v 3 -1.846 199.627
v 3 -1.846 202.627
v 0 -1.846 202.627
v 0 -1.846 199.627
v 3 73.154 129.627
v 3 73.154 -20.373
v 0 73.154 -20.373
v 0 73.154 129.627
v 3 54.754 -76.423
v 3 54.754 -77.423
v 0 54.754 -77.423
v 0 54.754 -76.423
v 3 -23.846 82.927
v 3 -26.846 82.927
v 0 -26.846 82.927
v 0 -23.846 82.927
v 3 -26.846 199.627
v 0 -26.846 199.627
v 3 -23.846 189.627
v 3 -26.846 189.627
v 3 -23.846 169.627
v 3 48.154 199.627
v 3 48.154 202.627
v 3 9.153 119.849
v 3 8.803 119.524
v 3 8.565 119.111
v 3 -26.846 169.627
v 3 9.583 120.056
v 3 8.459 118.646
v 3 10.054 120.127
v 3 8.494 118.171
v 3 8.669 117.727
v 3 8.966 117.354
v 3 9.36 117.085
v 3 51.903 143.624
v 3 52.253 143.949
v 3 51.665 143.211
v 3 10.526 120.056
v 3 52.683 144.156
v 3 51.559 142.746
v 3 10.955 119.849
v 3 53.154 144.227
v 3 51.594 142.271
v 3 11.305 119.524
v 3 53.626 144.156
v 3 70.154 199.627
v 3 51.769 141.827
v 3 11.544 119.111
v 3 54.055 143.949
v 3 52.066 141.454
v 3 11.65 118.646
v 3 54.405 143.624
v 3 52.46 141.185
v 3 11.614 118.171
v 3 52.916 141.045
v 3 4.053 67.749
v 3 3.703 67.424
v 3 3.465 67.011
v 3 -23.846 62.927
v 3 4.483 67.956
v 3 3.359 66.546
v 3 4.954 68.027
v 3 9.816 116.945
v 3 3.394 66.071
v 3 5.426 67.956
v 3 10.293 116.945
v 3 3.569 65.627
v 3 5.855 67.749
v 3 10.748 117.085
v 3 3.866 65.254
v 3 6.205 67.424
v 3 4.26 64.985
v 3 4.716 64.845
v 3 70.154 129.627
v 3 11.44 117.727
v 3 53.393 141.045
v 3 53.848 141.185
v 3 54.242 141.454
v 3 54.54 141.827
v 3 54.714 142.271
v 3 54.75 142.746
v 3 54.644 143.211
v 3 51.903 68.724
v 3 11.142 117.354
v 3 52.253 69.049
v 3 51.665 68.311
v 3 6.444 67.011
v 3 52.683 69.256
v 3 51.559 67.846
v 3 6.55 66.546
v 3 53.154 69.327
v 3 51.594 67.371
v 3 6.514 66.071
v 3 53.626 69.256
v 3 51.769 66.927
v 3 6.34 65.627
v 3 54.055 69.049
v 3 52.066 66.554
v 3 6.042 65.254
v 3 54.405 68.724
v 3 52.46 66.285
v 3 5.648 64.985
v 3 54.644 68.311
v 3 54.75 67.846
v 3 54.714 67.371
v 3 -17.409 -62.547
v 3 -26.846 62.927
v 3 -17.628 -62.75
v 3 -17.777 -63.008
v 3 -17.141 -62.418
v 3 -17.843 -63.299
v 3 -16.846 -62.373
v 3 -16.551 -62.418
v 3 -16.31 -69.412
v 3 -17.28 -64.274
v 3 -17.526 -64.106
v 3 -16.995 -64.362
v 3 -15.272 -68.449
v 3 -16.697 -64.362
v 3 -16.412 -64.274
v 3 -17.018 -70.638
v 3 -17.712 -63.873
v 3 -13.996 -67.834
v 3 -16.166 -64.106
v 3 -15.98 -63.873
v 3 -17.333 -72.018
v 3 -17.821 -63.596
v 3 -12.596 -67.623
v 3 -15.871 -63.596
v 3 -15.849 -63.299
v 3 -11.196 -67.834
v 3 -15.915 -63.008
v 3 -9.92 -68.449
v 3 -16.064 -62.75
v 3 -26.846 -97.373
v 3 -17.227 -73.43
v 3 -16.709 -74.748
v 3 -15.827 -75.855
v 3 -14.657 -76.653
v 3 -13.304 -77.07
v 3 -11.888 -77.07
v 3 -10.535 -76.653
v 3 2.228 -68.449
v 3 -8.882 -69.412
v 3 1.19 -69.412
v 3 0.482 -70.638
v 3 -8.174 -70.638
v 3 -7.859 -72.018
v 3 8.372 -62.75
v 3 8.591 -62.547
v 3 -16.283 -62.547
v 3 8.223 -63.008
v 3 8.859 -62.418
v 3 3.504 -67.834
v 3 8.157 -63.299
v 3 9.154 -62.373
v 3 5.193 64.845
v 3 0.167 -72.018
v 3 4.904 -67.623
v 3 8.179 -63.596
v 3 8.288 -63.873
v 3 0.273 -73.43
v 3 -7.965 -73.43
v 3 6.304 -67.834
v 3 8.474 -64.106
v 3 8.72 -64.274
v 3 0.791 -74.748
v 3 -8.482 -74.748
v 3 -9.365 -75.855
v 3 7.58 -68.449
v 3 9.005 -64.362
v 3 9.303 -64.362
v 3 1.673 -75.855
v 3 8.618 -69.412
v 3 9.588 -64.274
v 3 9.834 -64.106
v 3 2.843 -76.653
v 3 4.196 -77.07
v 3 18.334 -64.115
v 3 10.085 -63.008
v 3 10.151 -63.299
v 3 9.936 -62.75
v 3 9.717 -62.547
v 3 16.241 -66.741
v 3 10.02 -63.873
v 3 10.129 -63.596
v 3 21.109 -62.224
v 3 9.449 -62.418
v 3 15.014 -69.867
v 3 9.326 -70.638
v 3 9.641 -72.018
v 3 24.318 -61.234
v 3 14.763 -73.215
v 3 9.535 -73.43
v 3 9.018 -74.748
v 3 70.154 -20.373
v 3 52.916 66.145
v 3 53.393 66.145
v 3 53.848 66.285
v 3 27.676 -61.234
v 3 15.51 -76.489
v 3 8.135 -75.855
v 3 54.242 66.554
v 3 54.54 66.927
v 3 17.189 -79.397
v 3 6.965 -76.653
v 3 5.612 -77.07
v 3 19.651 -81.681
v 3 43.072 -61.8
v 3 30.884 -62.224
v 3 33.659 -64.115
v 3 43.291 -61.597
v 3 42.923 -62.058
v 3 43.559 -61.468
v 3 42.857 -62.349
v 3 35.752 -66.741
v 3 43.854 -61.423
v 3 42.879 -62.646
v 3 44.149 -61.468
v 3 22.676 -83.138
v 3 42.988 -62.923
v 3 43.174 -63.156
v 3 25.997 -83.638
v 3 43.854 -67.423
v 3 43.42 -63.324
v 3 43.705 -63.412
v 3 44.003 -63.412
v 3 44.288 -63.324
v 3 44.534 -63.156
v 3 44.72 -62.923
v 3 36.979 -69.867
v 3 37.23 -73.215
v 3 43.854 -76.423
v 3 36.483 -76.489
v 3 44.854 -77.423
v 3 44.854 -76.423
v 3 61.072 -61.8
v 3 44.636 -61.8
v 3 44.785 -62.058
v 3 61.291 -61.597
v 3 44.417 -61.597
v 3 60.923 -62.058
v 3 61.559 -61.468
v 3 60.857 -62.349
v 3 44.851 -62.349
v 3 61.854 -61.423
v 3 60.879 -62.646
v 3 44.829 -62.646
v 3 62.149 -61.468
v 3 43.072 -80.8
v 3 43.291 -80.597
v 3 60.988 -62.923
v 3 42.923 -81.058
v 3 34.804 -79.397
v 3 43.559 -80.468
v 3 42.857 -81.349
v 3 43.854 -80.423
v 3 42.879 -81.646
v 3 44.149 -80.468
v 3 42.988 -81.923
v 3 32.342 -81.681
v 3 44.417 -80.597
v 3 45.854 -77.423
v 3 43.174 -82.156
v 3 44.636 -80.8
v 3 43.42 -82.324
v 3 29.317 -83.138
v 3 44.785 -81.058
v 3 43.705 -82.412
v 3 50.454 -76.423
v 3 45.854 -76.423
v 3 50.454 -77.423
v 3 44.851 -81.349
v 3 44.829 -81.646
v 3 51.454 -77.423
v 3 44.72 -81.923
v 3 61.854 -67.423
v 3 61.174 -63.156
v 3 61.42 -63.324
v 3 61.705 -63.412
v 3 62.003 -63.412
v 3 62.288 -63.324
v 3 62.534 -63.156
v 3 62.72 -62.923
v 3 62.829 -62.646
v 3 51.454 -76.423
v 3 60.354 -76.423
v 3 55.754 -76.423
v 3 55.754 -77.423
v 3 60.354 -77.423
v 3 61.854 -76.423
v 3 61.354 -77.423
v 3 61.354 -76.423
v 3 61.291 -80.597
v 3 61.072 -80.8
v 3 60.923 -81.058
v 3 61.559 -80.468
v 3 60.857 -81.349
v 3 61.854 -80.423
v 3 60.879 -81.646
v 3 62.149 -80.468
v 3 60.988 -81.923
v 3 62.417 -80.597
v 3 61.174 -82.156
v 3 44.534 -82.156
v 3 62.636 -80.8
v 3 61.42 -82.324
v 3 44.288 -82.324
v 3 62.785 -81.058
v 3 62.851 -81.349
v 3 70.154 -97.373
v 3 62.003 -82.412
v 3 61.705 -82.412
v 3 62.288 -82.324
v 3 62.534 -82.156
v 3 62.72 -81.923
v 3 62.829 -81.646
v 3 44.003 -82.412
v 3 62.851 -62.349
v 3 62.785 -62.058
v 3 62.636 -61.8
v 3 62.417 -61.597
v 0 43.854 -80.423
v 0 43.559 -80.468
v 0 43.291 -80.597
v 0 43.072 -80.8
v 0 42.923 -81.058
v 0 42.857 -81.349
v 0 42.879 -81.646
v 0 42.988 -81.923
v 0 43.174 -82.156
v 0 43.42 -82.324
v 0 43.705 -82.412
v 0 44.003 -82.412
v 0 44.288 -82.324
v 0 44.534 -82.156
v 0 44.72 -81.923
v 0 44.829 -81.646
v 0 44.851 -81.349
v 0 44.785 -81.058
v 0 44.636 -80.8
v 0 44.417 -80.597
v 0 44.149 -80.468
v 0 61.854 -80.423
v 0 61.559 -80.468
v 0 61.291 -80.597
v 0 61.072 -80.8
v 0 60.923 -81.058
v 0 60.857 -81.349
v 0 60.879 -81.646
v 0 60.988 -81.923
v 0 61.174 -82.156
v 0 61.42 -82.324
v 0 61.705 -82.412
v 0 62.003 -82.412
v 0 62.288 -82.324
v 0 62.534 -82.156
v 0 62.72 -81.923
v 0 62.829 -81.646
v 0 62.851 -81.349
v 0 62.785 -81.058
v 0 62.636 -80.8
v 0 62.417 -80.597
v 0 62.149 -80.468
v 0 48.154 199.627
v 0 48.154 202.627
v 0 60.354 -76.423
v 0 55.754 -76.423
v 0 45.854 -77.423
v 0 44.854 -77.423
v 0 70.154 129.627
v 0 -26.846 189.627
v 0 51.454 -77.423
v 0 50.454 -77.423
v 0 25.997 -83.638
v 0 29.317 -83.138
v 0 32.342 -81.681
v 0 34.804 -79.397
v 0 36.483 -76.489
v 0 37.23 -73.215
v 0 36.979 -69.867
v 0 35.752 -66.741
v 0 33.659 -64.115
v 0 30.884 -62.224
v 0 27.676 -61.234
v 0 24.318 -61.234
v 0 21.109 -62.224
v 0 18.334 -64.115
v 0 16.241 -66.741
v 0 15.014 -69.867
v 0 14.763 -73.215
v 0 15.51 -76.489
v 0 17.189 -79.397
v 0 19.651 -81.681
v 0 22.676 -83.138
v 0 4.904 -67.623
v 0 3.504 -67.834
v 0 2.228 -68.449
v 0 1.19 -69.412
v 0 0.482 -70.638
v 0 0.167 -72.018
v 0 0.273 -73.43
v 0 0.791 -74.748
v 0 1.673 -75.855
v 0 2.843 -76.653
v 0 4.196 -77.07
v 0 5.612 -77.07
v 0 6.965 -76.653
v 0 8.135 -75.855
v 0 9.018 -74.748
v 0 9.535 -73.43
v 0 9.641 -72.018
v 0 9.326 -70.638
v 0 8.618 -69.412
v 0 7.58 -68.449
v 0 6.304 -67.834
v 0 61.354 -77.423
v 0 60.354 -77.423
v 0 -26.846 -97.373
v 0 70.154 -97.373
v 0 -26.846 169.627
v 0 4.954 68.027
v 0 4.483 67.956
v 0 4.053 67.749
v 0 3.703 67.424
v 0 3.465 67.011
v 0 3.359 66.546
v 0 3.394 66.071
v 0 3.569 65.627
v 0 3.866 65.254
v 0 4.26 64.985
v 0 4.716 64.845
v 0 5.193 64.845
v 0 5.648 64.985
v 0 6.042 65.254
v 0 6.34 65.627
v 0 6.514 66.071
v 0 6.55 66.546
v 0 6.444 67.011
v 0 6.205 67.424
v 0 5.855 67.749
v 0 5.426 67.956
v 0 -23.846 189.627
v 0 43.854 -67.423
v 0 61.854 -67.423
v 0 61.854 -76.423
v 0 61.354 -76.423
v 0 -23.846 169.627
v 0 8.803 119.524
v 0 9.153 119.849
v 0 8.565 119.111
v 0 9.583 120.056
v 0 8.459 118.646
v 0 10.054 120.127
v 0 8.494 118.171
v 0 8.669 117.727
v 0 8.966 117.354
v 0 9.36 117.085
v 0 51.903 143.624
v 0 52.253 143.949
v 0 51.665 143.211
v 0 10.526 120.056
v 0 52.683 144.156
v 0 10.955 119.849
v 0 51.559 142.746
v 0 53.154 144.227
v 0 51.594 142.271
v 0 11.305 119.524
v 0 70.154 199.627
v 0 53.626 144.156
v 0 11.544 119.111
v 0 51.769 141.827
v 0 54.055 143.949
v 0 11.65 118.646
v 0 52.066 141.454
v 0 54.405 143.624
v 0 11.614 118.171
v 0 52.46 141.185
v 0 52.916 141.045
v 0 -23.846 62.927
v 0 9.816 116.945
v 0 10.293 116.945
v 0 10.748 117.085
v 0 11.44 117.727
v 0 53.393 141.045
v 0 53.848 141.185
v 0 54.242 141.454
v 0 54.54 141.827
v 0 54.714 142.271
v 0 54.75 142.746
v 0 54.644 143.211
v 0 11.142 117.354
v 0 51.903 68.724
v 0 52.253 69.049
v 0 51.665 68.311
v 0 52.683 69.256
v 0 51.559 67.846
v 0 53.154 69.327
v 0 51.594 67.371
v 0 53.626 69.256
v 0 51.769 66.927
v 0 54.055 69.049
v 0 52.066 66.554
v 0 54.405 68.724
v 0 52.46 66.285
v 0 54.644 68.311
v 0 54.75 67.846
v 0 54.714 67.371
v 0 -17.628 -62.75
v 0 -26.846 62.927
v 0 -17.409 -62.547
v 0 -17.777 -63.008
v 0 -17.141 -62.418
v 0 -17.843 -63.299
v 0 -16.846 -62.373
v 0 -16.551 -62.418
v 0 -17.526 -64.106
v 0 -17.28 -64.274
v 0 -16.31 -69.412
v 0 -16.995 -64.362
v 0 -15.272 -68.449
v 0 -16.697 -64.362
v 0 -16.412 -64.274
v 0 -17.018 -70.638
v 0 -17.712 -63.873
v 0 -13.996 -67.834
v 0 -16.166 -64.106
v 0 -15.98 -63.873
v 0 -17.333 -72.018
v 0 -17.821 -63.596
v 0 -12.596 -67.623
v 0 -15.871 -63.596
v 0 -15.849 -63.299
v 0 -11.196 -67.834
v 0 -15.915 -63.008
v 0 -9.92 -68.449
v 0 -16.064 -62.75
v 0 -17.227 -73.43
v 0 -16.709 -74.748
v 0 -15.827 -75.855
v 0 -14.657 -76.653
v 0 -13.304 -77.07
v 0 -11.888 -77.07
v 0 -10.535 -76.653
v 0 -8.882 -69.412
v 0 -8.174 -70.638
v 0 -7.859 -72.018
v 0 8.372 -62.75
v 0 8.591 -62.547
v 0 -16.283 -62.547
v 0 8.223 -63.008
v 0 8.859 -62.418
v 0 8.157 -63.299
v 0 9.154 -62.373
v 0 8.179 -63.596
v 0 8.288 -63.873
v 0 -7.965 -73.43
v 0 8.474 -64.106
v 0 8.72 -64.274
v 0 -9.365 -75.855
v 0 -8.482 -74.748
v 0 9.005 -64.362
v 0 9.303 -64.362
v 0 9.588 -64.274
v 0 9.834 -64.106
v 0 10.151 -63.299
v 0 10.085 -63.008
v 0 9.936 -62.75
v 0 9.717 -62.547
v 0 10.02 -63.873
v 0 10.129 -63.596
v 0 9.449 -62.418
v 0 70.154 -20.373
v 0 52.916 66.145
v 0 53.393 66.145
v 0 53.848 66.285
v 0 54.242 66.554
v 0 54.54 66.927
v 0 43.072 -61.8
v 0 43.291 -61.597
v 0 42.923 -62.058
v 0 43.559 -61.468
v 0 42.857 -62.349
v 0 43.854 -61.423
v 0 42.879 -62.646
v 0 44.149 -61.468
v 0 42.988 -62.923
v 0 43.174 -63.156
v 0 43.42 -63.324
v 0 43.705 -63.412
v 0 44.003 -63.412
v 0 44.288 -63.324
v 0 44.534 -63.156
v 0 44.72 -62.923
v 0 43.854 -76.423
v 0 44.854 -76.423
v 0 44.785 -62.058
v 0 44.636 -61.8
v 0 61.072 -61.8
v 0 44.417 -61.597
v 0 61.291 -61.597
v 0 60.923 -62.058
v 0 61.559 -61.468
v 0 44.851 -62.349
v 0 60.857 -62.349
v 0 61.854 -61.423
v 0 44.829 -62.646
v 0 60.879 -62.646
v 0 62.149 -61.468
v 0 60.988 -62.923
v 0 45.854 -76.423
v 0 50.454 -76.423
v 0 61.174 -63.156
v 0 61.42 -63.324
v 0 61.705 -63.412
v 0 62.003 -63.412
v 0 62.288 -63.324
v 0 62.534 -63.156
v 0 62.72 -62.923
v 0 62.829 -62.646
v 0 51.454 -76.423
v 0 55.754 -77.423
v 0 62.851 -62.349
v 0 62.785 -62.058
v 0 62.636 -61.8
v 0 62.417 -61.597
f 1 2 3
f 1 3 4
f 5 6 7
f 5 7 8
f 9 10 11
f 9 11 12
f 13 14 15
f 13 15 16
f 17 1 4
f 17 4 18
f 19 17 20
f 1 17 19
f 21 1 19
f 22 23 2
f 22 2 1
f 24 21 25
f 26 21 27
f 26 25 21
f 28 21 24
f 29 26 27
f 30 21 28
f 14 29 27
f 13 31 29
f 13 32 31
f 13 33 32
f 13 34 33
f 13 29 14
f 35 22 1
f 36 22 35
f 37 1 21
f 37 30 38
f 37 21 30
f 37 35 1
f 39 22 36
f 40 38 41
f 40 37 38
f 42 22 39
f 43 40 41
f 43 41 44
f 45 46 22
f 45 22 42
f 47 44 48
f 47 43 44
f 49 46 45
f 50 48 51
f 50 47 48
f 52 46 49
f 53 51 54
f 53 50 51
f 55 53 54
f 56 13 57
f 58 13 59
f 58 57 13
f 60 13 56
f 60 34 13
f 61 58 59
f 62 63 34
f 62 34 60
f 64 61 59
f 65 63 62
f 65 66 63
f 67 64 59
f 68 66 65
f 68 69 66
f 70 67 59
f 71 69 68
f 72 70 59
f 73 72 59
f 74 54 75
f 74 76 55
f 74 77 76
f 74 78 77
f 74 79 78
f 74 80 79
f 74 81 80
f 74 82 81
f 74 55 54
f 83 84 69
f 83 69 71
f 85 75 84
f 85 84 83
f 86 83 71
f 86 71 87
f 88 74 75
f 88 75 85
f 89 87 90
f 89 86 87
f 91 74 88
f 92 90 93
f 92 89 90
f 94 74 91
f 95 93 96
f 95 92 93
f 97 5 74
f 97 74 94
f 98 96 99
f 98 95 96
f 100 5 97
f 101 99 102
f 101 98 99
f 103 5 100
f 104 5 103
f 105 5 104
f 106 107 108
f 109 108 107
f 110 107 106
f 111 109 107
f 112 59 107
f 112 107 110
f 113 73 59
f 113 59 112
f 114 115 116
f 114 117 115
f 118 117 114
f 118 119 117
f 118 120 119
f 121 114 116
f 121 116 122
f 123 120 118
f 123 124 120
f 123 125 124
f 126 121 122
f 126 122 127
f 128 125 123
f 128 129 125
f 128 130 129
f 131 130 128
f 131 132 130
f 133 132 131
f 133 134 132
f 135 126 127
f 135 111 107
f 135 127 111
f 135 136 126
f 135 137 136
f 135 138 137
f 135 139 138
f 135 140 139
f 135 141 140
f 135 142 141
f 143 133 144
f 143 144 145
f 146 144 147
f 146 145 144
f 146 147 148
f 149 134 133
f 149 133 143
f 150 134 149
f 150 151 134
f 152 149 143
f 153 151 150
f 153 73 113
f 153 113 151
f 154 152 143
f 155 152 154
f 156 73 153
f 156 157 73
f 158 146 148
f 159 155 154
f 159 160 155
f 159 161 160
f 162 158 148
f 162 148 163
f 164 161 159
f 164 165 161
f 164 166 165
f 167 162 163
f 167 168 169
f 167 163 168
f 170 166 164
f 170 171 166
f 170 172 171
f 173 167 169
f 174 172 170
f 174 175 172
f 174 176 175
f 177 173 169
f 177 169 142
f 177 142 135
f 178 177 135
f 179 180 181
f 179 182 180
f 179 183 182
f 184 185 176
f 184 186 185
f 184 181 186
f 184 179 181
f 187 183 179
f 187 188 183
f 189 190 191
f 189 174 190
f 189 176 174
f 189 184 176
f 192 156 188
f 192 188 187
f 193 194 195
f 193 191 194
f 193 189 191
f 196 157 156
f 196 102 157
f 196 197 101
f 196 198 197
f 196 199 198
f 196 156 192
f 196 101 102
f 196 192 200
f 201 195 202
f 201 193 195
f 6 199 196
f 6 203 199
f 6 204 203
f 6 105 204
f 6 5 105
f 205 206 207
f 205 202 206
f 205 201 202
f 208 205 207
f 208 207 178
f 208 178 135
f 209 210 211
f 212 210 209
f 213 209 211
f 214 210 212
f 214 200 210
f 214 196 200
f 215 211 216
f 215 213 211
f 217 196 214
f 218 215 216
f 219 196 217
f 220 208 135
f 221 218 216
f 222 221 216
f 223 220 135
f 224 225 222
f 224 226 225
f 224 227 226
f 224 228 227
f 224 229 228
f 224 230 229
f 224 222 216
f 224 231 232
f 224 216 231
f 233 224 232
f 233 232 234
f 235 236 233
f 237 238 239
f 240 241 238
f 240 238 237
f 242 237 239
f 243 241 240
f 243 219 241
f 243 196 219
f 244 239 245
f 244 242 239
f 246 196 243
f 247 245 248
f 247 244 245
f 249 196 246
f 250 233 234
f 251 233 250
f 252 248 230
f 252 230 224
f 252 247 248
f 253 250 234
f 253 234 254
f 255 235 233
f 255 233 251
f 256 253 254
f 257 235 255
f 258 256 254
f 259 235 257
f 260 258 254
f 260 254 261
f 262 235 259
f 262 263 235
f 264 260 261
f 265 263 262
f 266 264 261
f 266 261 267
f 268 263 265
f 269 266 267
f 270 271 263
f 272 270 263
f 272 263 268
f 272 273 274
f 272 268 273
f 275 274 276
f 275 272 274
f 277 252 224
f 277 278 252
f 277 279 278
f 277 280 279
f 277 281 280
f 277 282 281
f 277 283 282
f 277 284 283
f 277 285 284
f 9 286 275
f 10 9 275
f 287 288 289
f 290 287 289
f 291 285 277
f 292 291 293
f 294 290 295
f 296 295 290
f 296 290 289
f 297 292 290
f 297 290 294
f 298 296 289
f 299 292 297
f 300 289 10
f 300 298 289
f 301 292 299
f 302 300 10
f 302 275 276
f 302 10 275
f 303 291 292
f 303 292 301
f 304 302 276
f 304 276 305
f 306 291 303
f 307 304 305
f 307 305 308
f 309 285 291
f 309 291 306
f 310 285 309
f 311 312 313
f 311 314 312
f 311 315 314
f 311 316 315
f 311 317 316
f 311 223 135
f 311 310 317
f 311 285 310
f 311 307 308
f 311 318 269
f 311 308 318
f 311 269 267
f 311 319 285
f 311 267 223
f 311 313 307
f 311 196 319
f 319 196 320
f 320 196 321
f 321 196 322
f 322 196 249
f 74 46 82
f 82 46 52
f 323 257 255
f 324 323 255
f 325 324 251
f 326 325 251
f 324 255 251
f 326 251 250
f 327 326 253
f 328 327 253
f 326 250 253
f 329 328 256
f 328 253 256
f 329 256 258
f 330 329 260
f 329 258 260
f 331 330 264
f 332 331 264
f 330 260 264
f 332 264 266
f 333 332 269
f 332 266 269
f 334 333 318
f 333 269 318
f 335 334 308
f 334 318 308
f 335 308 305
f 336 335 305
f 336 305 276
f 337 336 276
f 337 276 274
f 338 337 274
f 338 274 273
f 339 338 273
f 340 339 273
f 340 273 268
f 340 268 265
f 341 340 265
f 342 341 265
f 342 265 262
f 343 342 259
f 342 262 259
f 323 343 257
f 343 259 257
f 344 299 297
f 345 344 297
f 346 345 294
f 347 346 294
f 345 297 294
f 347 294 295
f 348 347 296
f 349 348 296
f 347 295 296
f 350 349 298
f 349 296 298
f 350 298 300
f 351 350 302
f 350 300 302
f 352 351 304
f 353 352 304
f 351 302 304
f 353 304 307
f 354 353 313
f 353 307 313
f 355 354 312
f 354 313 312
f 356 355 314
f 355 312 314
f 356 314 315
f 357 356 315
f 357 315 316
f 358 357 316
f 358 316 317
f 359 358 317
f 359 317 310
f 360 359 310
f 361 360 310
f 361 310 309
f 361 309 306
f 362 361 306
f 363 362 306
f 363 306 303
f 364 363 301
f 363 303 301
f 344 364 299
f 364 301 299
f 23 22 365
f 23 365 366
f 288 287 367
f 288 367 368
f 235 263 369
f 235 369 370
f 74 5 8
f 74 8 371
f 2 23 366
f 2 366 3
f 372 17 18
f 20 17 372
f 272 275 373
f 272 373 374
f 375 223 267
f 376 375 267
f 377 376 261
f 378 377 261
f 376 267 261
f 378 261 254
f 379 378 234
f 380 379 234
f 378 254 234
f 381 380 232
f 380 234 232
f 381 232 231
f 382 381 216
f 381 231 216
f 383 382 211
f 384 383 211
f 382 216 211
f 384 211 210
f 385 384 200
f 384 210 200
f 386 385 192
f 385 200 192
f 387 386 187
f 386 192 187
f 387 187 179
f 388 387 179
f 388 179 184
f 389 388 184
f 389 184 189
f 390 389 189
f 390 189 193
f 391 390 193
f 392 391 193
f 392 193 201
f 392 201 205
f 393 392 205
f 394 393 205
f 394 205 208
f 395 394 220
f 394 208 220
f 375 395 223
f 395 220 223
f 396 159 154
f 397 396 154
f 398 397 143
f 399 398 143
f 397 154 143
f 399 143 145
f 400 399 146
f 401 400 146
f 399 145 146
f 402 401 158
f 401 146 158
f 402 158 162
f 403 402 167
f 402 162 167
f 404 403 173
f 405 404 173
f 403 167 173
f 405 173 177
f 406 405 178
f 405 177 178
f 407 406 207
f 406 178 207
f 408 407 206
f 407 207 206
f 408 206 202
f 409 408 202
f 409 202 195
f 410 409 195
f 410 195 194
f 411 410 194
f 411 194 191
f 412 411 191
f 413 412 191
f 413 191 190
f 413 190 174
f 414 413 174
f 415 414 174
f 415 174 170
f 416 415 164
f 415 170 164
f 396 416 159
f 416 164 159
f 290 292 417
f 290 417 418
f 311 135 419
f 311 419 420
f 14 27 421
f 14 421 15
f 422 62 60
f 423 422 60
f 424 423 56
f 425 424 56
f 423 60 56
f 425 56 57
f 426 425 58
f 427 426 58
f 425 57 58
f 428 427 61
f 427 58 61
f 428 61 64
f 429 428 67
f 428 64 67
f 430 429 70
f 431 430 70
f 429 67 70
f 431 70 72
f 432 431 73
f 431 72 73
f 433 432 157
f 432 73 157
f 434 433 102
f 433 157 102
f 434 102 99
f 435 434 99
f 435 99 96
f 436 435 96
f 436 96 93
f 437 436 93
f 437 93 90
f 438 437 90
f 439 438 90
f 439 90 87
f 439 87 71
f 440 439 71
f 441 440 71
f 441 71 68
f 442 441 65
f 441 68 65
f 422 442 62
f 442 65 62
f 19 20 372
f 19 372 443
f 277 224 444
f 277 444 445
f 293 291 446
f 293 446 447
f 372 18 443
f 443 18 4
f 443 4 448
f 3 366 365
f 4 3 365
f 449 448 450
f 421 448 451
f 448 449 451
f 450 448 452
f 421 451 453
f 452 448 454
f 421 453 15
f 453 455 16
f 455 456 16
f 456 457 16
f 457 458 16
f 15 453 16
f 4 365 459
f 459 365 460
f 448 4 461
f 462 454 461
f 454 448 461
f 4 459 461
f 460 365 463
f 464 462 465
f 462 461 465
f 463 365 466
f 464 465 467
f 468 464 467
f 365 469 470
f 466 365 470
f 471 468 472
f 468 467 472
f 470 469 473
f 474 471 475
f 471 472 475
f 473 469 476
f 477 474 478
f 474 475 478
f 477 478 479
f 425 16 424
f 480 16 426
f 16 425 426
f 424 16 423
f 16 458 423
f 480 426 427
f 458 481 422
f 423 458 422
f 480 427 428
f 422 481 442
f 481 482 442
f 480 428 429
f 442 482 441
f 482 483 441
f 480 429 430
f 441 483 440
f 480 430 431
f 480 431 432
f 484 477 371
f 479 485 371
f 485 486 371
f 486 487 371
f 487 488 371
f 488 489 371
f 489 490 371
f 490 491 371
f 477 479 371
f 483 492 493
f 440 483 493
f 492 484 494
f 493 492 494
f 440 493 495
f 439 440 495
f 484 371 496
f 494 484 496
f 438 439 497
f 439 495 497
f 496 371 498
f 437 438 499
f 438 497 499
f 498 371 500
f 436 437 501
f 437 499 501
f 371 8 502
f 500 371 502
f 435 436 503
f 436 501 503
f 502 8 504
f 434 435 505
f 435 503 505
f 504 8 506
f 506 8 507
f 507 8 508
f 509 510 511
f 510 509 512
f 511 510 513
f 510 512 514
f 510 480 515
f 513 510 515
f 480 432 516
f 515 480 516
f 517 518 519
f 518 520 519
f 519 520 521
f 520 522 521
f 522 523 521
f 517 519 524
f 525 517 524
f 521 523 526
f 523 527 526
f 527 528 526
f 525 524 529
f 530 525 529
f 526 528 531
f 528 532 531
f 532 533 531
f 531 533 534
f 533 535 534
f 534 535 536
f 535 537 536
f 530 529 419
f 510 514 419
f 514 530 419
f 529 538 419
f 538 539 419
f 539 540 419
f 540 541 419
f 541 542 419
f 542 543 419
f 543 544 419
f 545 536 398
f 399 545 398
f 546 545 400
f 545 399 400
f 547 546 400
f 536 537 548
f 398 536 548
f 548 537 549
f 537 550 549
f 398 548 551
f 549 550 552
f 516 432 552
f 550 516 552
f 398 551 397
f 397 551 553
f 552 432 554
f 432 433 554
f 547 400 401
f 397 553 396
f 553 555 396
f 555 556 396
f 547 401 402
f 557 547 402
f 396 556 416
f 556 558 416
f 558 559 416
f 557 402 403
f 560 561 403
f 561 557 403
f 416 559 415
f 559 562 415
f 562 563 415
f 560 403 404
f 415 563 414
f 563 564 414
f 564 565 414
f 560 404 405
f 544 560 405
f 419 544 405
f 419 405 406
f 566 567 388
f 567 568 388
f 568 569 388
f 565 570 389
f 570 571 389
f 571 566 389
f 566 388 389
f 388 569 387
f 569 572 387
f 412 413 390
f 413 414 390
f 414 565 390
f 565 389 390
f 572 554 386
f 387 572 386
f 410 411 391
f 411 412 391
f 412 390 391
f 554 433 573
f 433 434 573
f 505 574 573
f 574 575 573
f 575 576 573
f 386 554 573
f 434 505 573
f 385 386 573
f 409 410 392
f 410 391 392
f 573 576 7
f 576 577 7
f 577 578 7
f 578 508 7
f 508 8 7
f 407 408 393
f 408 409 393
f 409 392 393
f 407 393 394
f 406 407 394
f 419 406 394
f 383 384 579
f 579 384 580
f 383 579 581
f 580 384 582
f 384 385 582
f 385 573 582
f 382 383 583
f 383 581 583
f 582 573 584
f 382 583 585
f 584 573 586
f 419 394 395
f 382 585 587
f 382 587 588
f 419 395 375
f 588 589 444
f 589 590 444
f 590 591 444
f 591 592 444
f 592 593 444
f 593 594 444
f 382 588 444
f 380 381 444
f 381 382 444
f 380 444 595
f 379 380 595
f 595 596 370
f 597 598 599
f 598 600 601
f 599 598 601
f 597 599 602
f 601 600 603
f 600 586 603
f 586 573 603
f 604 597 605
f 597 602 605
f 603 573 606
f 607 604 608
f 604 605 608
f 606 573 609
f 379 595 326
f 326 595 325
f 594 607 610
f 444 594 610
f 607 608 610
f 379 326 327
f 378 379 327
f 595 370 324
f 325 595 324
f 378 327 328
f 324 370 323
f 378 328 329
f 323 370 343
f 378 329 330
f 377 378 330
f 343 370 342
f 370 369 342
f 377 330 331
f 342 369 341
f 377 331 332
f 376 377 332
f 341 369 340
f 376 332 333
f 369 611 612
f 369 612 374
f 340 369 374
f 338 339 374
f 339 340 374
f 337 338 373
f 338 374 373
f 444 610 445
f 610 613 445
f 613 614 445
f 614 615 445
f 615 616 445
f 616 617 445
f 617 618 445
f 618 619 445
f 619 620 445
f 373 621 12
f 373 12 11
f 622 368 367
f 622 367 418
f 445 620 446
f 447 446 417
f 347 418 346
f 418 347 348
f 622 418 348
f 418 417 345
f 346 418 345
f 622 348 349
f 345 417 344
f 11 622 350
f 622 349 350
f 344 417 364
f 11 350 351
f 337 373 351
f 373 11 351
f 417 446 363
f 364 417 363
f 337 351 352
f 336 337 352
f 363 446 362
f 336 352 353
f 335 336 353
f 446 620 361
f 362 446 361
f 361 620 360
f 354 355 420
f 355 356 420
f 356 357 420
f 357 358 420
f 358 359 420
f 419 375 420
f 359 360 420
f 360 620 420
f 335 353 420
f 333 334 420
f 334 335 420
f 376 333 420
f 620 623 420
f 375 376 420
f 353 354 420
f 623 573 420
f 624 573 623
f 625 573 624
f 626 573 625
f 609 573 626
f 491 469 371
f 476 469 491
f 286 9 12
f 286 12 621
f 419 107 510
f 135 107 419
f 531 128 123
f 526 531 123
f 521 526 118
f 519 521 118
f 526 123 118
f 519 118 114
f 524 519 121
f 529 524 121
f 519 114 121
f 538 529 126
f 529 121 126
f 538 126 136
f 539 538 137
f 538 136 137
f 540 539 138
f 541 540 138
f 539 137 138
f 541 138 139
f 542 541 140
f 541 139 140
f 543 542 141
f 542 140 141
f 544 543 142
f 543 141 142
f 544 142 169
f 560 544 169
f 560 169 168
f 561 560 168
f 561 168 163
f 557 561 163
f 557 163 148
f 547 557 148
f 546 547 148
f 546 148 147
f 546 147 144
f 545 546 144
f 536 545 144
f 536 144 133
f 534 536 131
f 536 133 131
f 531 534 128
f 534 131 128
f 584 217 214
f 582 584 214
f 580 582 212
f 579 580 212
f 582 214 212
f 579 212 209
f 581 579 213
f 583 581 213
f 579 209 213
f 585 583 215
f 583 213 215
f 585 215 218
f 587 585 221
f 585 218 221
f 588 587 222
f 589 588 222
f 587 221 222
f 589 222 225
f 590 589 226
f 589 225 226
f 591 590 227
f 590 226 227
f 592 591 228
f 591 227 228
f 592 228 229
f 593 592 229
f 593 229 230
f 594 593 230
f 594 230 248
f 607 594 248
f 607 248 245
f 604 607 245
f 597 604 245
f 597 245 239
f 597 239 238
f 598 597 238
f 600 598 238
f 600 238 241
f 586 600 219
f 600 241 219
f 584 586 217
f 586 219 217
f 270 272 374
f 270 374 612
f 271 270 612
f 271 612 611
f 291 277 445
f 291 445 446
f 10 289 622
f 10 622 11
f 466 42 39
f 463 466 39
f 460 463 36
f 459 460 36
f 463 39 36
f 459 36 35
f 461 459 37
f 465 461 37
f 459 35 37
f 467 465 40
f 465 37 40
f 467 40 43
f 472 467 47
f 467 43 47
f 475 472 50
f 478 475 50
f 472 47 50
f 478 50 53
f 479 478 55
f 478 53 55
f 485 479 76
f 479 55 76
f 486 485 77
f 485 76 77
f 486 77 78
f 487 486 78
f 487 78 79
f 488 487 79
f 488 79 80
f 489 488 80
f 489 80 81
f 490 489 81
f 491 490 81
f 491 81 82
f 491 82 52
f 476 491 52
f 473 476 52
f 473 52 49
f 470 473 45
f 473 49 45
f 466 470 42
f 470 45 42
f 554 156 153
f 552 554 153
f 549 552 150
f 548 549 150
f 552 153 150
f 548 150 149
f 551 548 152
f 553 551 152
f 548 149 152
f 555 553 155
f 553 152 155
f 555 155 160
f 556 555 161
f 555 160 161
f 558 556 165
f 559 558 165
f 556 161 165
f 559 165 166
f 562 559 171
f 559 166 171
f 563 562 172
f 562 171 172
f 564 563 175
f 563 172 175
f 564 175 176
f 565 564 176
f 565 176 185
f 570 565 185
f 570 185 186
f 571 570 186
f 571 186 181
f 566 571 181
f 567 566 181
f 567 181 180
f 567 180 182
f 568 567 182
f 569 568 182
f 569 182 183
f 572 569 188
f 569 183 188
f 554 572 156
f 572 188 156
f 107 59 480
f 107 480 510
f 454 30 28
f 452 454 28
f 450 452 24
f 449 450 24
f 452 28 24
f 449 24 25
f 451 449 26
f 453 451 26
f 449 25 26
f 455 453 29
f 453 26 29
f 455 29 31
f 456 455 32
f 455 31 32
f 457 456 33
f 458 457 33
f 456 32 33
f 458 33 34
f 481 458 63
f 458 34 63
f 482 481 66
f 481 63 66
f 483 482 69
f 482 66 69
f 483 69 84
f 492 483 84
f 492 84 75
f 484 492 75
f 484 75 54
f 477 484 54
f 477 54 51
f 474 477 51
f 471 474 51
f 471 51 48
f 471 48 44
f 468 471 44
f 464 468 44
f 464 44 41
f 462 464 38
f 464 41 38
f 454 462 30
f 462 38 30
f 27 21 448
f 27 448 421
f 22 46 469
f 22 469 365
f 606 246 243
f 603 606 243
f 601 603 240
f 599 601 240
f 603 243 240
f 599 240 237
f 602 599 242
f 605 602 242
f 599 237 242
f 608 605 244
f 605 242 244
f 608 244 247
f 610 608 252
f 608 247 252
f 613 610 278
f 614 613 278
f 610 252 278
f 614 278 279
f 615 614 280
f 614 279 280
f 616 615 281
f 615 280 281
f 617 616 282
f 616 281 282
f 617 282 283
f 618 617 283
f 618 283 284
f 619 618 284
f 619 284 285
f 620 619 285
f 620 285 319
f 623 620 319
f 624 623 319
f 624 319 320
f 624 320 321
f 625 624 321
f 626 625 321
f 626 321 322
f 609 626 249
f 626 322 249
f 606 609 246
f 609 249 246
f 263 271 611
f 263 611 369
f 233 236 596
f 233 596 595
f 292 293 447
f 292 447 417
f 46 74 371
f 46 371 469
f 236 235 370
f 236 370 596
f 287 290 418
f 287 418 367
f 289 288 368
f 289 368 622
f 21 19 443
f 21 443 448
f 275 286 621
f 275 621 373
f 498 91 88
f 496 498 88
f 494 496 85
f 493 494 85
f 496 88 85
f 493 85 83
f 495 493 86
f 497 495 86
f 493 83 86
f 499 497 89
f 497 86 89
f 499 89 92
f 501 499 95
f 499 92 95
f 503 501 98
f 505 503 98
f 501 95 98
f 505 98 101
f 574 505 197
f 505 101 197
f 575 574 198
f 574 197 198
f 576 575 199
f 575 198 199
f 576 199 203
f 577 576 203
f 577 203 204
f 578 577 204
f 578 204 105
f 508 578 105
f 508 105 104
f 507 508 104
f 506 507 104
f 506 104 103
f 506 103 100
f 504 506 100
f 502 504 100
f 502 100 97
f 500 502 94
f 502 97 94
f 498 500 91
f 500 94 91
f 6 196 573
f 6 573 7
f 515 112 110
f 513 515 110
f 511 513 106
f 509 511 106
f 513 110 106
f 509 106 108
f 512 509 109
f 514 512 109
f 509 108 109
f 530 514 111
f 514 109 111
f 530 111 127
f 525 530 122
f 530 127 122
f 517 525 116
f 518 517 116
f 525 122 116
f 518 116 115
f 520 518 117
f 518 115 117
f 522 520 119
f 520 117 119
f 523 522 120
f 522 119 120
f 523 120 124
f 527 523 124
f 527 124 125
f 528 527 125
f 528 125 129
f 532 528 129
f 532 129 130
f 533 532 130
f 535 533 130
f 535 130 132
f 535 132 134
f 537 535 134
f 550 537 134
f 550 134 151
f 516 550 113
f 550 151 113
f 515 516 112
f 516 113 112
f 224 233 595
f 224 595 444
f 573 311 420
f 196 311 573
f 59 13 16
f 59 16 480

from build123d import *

# Parameters (mm, degrees)
ESQUISSE1_R        = 1
ESQUISSE1_R_2      = 4.75
ESQUISSE1_R_3      = 1.6
ESQUISSE1_R_4      = 11.265
BOSS_EXTRU_1_DEPTH = 3


with BuildPart() as part:
    # Esquisse1 → Boss.-Extru.1 (new body)
    with BuildSketch(Plane(origin=(3, 0, 0), x_dir=(0, 0, -1), z_dir=(1, 0, 0))):
        Polygon((-199.626758929, -26.84585796), (-189.626758929, -26.84585796), (-189.626758929, -23.84585796), (-169.626758929, -23.84585796), (-169.626758929, -26.84585796), (-82.926758929, -26.84585796), (-82.926758929, -23.84585796), (-62.926758929, -23.84585796), (-62.926758929, -26.84585796), (97.373241071, -26.84585796), (97.373241071, 70.15414204), (20.373241071, 70.15414204), (20.373241071, 73.15414204), (-129.626758929, 73.15414204), (-129.626758929, 70.15414204), (-199.626758929, 70.15414204), (-199.626758929, 48.15414204), (-202.626758929, 48.15414204), (-202.626758929, -1.84585796), (-199.626758929, -1.84585796), align=None)
        with Locations(Location((63.373241071, -16.84585796, 0), (0, 0, 180))):
            Circle(ESQUISSE1_R, mode=Mode.SUBTRACT)
        with Locations(Location((72.373241071, 4.90414204, 0), (0, 0, 180))):
            Circle(ESQUISSE1_R_2, mode=Mode.SUBTRACT)
        with Locations(Location((-67.726758929, 53.15414204, 0), (0, 0, 180))):
            Circle(ESQUISSE1_R_3, mode=Mode.SUBTRACT)
        with Locations(Location((-118.526758929, 10.05414204, 0), (0, 0, 180))):
            Circle(ESQUISSE1_R_3, mode=Mode.SUBTRACT)
        with Locations(Location((-142.626758929, 53.15414204, 0), (0, 0, 180))):
            Circle(ESQUISSE1_R_3, mode=Mode.SUBTRACT)
        with Locations(Location((-66.426758929, 4.95414204, 0), (0, 0, 180))):
            Circle(ESQUISSE1_R_3, mode=Mode.SUBTRACT)
        with Locations(Location((72.373241071, -12.59585796, 0), (0, 0, 180))):
            Circle(ESQUISSE1_R_2, mode=Mode.SUBTRACT)
        with Locations(Location((63.373241071, 9.15414204, 0), (0, 0, 180))):
            Circle(ESQUISSE1_R, mode=Mode.SUBTRACT)
        with Locations(Location((62.423241071, 43.85414204, 0), (0, 0, 180))):
            Circle(ESQUISSE1_R, mode=Mode.SUBTRACT)
        with Locations(Location((62.423241071, 61.85414204, 0), (0, 0, 180))):
            Circle(ESQUISSE1_R, mode=Mode.SUBTRACT)
        with Locations((72.373241071, 25.996622543)):
            Circle(ESQUISSE1_R_4, mode=Mode.SUBTRACT)
        with Locations(Location((81.423241071, 43.85414204, 0), (0, 0, 180))):
            Circle(ESQUISSE1_R, mode=Mode.SUBTRACT)
        with Locations(Location((81.423241071, 61.85414204, 0), (0, 0, 180))):
            Circle(ESQUISSE1_R, mode=Mode.SUBTRACT)
        Polygon((77.423241071, 44.85414204), (76.423241071, 44.85414204), (76.423241071, 43.85414204), (67.423241071, 43.85414204), (67.423241071, 61.85414204), (76.423241071, 61.85414204), (76.423241071, 61.35414204), (77.423241071, 61.35414204), (77.423241071, 60.35414204), (76.423241071, 60.35414204), (76.423241071, 55.75414204), (77.423241071, 55.75414204), (77.423241071, 54.75414204), (76.423241071, 54.75414204), (76.423241071, 51.45414204), (77.423241071, 51.45414204), (77.423241071, 50.45414204), (76.423241071, 50.45414204), (76.423241071, 45.85414204), (77.423241071, 45.85414204), align=None, mode=Mode.SUBTRACT)
    extrude(amount=-BOSS_EXTRU_1_DEPTH)


solid = part.part
